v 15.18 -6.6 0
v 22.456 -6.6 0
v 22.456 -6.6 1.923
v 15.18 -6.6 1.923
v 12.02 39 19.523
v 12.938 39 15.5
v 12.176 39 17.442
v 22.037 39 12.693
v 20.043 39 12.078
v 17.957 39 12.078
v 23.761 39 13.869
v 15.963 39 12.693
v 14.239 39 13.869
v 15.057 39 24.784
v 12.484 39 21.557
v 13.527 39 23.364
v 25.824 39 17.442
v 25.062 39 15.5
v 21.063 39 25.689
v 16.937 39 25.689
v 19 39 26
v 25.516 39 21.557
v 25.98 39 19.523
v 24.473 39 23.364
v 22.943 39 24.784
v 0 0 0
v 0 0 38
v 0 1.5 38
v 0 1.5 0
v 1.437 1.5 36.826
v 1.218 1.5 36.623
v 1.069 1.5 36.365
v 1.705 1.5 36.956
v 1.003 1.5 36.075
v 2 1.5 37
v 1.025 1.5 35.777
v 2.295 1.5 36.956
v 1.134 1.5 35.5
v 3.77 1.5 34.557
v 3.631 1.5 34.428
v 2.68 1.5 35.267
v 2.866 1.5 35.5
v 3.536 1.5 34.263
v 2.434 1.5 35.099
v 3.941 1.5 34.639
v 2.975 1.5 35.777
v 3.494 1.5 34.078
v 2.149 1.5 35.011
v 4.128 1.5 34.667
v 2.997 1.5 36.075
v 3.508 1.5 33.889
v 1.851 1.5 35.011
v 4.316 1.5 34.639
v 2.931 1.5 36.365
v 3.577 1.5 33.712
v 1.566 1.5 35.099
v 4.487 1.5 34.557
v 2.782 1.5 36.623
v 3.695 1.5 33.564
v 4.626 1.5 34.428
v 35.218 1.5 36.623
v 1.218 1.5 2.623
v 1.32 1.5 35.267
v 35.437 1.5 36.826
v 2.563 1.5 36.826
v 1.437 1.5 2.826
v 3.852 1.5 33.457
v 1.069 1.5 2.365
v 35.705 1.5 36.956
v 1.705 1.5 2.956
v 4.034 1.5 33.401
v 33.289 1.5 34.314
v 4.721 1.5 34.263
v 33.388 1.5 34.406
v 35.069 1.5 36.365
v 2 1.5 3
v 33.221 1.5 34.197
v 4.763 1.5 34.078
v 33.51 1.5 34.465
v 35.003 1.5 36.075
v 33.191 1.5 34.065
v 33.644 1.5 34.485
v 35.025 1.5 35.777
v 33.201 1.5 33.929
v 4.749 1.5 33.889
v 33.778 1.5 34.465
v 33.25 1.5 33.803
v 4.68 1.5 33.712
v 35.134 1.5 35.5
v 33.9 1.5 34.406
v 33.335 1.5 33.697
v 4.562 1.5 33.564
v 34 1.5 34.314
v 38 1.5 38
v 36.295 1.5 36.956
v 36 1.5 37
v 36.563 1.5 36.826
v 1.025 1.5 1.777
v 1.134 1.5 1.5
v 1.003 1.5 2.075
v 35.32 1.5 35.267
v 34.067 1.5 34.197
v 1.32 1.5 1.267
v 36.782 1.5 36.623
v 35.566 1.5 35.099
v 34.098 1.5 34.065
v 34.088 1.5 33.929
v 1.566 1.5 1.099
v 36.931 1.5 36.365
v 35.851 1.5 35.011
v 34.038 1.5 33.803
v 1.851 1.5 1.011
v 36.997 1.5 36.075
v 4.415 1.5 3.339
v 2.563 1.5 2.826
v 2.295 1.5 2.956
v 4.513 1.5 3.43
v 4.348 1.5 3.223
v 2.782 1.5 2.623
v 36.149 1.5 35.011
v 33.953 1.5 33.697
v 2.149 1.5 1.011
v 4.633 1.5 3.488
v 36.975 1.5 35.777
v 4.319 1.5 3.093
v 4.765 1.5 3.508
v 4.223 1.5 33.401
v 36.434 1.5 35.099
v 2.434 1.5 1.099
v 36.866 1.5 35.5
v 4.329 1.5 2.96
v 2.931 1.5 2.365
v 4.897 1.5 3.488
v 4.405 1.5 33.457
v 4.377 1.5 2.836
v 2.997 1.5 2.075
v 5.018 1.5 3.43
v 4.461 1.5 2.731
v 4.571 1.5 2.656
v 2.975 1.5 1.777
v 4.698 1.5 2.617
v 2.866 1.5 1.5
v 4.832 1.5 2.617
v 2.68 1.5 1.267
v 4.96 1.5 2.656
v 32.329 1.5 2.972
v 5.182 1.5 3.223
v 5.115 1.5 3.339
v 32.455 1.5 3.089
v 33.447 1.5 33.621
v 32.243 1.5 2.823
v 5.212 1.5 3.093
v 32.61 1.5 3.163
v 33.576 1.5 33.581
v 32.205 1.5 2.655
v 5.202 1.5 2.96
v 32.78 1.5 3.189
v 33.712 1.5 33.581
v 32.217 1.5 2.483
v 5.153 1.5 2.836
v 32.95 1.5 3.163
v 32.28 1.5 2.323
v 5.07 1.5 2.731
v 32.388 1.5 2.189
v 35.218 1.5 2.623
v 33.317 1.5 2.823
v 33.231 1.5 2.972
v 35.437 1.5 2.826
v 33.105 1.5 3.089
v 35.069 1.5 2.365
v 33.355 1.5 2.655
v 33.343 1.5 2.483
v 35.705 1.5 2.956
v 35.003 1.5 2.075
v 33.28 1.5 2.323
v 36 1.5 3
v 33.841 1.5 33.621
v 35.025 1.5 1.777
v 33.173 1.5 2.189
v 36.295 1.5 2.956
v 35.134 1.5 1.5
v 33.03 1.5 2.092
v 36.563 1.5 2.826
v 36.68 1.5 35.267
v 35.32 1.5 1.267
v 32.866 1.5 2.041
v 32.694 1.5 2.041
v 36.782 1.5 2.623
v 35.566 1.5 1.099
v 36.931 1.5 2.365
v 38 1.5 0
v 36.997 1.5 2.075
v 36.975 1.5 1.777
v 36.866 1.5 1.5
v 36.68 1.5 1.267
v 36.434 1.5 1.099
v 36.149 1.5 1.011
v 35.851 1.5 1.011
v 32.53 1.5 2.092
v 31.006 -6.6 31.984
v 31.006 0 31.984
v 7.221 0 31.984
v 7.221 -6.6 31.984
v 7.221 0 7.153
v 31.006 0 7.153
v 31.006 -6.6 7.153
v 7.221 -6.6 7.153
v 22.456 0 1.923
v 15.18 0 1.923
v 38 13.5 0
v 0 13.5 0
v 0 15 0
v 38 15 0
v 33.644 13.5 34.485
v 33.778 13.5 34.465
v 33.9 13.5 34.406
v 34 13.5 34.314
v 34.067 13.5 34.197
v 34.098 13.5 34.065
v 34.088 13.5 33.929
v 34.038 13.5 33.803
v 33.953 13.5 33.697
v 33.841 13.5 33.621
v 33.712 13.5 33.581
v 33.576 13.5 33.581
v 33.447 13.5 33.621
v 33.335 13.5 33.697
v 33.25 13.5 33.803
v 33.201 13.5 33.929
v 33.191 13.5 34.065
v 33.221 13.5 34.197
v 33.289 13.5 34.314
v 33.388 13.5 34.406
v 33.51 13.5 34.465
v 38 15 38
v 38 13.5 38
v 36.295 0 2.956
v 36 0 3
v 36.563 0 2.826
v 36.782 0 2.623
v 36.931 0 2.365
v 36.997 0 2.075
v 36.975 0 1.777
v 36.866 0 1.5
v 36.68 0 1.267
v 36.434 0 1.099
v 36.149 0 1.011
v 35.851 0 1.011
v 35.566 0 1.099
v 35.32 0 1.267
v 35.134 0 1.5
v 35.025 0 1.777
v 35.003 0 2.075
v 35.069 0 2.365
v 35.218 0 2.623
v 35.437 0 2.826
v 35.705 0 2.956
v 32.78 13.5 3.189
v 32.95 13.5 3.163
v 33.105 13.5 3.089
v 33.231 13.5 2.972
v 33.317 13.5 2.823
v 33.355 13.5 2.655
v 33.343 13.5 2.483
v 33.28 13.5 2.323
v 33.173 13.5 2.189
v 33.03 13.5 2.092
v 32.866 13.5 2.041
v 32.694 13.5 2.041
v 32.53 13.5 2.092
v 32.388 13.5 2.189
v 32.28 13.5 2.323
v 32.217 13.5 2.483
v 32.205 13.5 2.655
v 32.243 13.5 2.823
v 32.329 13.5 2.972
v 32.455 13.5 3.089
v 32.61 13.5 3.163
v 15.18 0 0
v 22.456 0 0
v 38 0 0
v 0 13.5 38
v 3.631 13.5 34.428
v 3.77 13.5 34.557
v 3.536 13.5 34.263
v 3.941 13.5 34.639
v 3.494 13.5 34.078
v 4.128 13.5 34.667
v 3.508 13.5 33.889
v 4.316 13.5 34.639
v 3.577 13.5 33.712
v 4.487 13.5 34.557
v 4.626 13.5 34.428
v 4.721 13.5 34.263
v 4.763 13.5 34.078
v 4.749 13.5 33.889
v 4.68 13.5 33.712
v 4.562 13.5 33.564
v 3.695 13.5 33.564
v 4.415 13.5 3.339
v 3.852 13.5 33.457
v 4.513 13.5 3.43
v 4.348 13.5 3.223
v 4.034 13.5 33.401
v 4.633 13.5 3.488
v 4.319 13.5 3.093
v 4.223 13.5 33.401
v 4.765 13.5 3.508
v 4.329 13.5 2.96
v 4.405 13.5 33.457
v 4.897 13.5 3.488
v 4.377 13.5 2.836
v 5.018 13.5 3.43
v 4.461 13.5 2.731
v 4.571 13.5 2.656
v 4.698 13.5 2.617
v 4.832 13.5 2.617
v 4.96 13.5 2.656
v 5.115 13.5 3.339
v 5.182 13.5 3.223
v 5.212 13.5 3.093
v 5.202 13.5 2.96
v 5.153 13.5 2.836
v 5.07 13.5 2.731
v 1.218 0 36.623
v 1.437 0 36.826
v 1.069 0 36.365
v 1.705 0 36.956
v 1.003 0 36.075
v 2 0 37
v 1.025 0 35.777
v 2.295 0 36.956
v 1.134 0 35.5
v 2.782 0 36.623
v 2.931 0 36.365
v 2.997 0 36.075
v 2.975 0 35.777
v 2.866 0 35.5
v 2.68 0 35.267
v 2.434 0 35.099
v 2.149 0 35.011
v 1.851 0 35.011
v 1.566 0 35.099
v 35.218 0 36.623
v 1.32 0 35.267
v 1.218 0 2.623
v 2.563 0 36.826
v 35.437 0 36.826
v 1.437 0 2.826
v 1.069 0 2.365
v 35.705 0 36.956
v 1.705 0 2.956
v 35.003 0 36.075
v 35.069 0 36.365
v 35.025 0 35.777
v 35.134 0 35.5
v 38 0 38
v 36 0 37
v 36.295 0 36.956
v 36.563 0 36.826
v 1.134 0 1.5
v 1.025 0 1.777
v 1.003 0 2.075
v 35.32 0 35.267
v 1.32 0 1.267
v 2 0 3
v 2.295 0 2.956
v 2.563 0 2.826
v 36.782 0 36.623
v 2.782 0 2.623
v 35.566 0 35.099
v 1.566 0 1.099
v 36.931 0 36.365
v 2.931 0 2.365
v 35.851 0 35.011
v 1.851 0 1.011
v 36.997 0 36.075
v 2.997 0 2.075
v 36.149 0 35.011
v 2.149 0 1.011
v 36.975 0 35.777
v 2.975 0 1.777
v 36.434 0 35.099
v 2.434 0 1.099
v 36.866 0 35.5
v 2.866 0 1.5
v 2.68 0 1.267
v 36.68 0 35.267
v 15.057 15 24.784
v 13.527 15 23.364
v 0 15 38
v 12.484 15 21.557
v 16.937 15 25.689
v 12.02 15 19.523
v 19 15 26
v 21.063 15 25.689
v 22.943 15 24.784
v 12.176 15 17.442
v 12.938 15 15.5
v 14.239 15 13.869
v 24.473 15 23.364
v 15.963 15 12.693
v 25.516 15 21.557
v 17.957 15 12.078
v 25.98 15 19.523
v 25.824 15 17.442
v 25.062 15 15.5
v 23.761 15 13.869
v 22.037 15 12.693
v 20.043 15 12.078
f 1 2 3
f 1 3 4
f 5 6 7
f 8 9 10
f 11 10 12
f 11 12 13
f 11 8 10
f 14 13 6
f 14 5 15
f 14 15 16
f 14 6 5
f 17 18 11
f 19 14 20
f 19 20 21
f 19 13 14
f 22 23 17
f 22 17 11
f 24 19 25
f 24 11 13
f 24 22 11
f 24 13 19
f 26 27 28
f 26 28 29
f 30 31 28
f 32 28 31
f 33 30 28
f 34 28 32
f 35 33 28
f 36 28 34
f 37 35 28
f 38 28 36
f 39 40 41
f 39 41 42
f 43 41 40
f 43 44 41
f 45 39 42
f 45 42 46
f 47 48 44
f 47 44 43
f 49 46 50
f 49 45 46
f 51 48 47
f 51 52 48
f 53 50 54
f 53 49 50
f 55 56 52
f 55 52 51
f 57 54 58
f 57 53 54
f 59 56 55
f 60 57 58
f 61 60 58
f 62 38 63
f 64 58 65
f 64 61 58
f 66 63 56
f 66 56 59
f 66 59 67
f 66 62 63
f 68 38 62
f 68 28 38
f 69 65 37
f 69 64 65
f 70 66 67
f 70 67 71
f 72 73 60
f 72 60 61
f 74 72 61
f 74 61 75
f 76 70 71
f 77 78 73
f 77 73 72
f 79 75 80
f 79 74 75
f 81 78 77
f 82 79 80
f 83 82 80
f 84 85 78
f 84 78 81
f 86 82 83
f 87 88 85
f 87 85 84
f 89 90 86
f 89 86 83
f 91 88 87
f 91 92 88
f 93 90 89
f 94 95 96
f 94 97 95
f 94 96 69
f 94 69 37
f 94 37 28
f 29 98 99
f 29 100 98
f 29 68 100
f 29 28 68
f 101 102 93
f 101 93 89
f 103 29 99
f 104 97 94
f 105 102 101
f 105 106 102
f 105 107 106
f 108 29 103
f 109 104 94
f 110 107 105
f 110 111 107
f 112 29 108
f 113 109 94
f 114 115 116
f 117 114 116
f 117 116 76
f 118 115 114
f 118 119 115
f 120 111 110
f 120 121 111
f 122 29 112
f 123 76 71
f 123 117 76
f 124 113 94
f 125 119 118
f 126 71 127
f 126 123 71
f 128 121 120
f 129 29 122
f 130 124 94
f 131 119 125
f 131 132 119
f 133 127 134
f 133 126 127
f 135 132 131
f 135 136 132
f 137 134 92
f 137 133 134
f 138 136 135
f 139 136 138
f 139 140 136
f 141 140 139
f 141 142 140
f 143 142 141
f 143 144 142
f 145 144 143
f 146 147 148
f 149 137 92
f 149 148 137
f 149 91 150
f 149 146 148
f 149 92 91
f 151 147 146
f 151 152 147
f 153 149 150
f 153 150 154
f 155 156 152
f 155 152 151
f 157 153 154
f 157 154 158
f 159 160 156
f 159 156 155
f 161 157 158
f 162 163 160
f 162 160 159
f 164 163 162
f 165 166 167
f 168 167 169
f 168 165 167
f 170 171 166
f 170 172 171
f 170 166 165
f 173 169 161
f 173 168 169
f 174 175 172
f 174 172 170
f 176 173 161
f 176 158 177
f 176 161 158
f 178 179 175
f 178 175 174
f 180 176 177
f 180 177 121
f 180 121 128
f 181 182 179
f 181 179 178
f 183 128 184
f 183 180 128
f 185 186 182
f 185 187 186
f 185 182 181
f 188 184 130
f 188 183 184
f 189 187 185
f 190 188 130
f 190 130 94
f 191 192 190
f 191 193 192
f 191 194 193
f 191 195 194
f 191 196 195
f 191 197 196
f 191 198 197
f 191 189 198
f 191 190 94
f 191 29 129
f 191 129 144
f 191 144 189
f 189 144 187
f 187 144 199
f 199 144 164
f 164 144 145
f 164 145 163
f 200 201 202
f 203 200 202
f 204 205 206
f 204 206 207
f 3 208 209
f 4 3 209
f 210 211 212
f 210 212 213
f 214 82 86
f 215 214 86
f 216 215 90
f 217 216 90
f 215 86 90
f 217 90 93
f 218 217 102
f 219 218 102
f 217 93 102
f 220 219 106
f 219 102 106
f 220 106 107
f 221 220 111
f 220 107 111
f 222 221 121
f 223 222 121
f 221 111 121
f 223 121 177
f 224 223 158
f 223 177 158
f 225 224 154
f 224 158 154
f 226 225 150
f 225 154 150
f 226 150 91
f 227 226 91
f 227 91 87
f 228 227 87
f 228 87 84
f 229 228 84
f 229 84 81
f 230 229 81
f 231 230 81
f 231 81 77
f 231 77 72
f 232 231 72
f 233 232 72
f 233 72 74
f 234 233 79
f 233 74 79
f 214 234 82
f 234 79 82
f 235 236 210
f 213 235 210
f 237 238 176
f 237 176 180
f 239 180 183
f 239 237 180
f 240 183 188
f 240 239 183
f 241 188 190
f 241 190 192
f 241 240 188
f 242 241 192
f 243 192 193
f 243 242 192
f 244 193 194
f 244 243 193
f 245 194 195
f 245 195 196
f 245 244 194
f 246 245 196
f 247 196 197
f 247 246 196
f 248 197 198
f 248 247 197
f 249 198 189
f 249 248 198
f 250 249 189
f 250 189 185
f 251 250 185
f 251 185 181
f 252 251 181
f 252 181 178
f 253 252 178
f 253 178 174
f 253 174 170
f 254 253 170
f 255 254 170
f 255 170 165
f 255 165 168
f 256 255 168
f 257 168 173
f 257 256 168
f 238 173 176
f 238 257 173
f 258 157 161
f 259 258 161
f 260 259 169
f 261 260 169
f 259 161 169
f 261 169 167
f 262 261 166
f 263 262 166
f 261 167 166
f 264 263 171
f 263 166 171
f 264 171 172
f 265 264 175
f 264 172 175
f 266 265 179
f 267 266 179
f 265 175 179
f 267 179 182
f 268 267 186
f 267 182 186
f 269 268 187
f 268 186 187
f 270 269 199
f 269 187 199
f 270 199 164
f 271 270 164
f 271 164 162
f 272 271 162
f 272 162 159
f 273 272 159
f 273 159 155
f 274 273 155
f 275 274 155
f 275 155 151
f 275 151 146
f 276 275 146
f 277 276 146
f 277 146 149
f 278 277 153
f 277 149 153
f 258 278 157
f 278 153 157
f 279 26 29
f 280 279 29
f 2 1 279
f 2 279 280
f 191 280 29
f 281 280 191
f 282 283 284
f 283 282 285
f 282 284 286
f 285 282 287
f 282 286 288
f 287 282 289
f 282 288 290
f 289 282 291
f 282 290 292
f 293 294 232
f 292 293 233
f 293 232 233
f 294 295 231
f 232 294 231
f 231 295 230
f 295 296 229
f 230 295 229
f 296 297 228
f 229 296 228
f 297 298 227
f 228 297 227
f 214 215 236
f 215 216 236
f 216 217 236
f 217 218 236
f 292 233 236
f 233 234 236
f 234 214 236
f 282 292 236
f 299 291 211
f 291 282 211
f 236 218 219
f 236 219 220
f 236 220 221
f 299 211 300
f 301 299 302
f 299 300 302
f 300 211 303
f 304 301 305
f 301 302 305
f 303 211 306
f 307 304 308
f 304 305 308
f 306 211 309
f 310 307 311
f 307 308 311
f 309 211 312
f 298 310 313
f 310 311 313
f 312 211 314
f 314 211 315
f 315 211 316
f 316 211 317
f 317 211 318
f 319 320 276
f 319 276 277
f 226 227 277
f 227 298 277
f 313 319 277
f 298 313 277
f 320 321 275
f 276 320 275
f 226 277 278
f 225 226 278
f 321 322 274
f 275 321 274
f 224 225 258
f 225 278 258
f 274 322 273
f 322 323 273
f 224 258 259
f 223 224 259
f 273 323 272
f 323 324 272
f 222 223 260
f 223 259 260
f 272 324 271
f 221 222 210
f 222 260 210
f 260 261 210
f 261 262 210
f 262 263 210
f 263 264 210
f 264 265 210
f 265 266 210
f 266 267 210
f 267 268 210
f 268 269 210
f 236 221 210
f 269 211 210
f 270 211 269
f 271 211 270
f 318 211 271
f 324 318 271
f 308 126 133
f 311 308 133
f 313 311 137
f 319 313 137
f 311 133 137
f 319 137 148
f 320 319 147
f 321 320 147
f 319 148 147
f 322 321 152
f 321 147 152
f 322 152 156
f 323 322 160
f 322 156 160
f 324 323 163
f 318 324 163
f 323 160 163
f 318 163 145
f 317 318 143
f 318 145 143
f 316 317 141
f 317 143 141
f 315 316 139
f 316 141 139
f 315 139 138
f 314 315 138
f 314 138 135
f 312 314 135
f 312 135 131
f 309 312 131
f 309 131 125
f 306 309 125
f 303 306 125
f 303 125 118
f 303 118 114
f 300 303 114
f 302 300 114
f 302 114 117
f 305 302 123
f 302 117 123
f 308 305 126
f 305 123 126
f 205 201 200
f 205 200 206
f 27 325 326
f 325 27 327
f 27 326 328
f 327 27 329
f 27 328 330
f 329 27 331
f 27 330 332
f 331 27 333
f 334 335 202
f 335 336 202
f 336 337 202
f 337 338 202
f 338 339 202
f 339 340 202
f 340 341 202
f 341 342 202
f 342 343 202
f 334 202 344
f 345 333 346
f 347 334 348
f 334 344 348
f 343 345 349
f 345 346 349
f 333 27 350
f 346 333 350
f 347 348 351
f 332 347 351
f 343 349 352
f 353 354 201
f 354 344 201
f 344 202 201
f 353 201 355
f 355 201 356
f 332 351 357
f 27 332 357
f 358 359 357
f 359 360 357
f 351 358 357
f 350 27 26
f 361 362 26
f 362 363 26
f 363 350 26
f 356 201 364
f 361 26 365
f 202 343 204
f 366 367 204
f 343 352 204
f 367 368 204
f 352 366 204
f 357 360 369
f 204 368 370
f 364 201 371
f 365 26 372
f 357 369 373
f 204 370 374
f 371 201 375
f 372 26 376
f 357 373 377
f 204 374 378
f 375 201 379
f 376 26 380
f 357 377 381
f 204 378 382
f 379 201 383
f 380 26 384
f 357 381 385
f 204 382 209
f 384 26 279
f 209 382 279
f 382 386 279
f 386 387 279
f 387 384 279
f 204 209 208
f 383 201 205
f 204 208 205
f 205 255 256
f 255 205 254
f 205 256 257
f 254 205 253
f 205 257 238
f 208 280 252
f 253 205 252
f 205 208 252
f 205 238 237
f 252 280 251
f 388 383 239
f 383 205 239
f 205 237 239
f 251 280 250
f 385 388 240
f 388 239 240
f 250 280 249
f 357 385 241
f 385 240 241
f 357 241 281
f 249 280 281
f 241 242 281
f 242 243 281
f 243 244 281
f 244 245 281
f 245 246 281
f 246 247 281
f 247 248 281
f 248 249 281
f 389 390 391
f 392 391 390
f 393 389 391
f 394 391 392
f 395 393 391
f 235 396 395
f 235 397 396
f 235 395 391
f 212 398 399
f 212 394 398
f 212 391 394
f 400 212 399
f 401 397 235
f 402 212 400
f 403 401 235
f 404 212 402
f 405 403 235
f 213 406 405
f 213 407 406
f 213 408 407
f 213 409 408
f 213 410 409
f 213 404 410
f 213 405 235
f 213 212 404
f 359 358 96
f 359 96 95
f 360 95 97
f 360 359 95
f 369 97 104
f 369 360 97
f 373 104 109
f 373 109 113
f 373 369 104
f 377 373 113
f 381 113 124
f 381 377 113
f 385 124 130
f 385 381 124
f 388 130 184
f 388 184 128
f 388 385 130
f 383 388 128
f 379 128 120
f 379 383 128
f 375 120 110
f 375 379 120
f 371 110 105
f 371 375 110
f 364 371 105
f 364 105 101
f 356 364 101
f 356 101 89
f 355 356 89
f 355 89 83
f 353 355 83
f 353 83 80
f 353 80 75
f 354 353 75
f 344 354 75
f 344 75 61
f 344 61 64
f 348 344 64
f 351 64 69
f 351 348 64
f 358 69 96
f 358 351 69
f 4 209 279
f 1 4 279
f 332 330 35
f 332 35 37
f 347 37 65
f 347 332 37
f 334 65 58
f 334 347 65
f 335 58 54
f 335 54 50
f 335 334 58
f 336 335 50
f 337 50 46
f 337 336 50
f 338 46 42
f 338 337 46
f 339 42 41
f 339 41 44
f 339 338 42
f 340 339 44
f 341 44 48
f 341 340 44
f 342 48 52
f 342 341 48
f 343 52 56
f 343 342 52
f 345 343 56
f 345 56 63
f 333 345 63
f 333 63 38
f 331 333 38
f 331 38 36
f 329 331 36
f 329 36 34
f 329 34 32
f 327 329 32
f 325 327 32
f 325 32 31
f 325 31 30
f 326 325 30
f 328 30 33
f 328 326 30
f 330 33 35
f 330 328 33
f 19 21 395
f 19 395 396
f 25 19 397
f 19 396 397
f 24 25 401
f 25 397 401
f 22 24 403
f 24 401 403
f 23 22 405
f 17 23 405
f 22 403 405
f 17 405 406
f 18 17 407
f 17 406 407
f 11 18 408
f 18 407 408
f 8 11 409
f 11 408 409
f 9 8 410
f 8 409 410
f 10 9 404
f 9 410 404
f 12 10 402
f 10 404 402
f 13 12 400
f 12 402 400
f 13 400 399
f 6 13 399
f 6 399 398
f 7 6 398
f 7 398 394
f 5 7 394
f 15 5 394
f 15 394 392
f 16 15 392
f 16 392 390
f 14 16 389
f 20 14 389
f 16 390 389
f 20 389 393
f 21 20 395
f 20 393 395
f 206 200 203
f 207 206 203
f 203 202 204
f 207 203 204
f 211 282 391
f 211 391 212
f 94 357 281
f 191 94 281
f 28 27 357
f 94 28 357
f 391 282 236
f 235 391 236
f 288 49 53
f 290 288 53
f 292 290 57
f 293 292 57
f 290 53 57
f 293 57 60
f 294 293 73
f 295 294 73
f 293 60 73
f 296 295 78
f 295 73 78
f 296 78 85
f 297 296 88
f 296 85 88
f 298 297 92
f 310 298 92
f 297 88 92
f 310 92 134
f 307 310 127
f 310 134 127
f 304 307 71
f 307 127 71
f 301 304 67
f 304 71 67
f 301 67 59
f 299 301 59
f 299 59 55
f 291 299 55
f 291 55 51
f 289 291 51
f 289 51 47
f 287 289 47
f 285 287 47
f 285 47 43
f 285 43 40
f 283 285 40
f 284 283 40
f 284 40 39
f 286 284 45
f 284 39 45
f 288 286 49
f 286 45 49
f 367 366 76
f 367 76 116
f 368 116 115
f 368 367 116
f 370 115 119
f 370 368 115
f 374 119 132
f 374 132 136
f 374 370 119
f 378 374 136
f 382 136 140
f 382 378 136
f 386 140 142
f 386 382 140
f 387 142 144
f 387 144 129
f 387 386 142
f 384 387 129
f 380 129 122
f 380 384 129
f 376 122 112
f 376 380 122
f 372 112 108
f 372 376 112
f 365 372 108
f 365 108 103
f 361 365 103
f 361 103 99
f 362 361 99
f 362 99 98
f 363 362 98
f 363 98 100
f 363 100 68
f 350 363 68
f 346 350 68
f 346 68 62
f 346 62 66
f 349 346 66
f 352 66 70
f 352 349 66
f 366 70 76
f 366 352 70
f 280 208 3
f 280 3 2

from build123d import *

# Parameters (mm, degrees)
SKETCH_1_W      = 38
SKETCH_1_H      = 38
SKETCH_1_R      = 1
EXTRUDE_1_DEPTH = 1.5
SKETCH_2_R      = 0.636700884
SKETCH_2_R_2    = 0.447912605
SKETCH_2_R_3    = 0.577059181
SKETCH_2_R_4    = 0.454786346
EXTRUDE_2_DEPTH = 12
SKETCH_3_W      = 38
SKETCH_3_H      = 38
EXTRUDE_3_DEPTH = 1.5
SKETCH_4_R      = 7
EXTRUDE_4_DEPTH = 24
SKETCH_5_W      = 23.785325885
SKETCH_5_H      = 24.83133448
SKETCH_5_W_2    = 7.276581533
SKETCH_5_H_2    = 1.922772716
EXTRUDE_5_DEPTH = 6.6


with BuildPart() as part:
    # 草图1 → 凸台-拉伸1 (new body)
    with BuildSketch(Plane(origin=(0, 0, 0), x_dir=(1, 0, 0), z_dir=(0, 1, 0))):
        with Locations((19, -19)):
            Rectangle(SKETCH_1_W, SKETCH_1_H)
        with Locations(Location((2, -2, 0), (0, 0, 270))):
            Circle(SKETCH_1_R, mode=Mode.SUBTRACT)
        with Locations(Location((36, -2, 0), (0, 0, 270))):
            Circle(SKETCH_1_R, mode=Mode.SUBTRACT)
        with Locations(Location((36, -36, 0), (0, 0, 270))):
            Circle(SKETCH_1_R, mode=Mode.SUBTRACT)
        with Locations(Location((2, -36, 0), (0, 0, 270))):
            Circle(SKETCH_1_R, mode=Mode.SUBTRACT)
    extrude(amount=EXTRUDE_1_DEPTH)

    # 草图2 → 凸台-拉伸2 (add)
    with BuildSketch(Plane(origin=(0, 1.5, 0), x_dir=(1, 0, 0), z_dir=(0, 1, 0))):
        with Locations(Location((4.128486493, -34.030688728, 0), (0, 0, 270))):
            Circle(SKETCH_2_R)
        with Locations(Location((4.765187377, -3.05973858, 0), (0, 0, 270))):
            Circle(SKETCH_2_R_2)
        with Locations(Location((32.780026277, -2.611825975, 0), (0, 0, 270))):
            Circle(SKETCH_2_R_3)
        with Locations(Location((33.644120334, -34.030688728, 0), (0, 0, 270))):
            Circle(SKETCH_2_R_4)
    extrude(amount=EXTRUDE_2_DEPTH)

    # 草图3 → 凸台-拉伸3 (add)
    with BuildSketch(Plane(origin=(0, 13.5, 0), x_dir=(1, 0, 0), z_dir=(0, 1, 0))):
        with Locations((19, -19)):
            Rectangle(SKETCH_3_W, SKETCH_3_H)
    extrude(amount=EXTRUDE_3_DEPTH)

    # 草图4 → 凸台-拉伸4 (add)
    with BuildSketch(Plane(origin=(0, 15, 0), x_dir=(1, 0, 0), z_dir=(0, 1, 0))):
        with Locations(Location((19, -19, 0), (0, 0, 270))):
            Circle(SKETCH_4_R)
    extrude(amount=EXTRUDE_4_DEPTH)

    # 草图5 → 凸台-拉伸5 (add)
    with BuildSketch(Plane(origin=(0, 0, 0), x_dir=(-1, 0, 0), z_dir=(0, -1, 0))):
        with Locations((-19.113696587, -19.568482932)):
            Rectangle(SKETCH_5_W, SKETCH_5_H)
        with Locations((-18.818085462, -0.961386358)):
            Rectangle(SKETCH_5_W_2, SKETCH_5_H_2)
    extrude(amount=EXTRUDE_5_DEPTH)


solid = part.part
